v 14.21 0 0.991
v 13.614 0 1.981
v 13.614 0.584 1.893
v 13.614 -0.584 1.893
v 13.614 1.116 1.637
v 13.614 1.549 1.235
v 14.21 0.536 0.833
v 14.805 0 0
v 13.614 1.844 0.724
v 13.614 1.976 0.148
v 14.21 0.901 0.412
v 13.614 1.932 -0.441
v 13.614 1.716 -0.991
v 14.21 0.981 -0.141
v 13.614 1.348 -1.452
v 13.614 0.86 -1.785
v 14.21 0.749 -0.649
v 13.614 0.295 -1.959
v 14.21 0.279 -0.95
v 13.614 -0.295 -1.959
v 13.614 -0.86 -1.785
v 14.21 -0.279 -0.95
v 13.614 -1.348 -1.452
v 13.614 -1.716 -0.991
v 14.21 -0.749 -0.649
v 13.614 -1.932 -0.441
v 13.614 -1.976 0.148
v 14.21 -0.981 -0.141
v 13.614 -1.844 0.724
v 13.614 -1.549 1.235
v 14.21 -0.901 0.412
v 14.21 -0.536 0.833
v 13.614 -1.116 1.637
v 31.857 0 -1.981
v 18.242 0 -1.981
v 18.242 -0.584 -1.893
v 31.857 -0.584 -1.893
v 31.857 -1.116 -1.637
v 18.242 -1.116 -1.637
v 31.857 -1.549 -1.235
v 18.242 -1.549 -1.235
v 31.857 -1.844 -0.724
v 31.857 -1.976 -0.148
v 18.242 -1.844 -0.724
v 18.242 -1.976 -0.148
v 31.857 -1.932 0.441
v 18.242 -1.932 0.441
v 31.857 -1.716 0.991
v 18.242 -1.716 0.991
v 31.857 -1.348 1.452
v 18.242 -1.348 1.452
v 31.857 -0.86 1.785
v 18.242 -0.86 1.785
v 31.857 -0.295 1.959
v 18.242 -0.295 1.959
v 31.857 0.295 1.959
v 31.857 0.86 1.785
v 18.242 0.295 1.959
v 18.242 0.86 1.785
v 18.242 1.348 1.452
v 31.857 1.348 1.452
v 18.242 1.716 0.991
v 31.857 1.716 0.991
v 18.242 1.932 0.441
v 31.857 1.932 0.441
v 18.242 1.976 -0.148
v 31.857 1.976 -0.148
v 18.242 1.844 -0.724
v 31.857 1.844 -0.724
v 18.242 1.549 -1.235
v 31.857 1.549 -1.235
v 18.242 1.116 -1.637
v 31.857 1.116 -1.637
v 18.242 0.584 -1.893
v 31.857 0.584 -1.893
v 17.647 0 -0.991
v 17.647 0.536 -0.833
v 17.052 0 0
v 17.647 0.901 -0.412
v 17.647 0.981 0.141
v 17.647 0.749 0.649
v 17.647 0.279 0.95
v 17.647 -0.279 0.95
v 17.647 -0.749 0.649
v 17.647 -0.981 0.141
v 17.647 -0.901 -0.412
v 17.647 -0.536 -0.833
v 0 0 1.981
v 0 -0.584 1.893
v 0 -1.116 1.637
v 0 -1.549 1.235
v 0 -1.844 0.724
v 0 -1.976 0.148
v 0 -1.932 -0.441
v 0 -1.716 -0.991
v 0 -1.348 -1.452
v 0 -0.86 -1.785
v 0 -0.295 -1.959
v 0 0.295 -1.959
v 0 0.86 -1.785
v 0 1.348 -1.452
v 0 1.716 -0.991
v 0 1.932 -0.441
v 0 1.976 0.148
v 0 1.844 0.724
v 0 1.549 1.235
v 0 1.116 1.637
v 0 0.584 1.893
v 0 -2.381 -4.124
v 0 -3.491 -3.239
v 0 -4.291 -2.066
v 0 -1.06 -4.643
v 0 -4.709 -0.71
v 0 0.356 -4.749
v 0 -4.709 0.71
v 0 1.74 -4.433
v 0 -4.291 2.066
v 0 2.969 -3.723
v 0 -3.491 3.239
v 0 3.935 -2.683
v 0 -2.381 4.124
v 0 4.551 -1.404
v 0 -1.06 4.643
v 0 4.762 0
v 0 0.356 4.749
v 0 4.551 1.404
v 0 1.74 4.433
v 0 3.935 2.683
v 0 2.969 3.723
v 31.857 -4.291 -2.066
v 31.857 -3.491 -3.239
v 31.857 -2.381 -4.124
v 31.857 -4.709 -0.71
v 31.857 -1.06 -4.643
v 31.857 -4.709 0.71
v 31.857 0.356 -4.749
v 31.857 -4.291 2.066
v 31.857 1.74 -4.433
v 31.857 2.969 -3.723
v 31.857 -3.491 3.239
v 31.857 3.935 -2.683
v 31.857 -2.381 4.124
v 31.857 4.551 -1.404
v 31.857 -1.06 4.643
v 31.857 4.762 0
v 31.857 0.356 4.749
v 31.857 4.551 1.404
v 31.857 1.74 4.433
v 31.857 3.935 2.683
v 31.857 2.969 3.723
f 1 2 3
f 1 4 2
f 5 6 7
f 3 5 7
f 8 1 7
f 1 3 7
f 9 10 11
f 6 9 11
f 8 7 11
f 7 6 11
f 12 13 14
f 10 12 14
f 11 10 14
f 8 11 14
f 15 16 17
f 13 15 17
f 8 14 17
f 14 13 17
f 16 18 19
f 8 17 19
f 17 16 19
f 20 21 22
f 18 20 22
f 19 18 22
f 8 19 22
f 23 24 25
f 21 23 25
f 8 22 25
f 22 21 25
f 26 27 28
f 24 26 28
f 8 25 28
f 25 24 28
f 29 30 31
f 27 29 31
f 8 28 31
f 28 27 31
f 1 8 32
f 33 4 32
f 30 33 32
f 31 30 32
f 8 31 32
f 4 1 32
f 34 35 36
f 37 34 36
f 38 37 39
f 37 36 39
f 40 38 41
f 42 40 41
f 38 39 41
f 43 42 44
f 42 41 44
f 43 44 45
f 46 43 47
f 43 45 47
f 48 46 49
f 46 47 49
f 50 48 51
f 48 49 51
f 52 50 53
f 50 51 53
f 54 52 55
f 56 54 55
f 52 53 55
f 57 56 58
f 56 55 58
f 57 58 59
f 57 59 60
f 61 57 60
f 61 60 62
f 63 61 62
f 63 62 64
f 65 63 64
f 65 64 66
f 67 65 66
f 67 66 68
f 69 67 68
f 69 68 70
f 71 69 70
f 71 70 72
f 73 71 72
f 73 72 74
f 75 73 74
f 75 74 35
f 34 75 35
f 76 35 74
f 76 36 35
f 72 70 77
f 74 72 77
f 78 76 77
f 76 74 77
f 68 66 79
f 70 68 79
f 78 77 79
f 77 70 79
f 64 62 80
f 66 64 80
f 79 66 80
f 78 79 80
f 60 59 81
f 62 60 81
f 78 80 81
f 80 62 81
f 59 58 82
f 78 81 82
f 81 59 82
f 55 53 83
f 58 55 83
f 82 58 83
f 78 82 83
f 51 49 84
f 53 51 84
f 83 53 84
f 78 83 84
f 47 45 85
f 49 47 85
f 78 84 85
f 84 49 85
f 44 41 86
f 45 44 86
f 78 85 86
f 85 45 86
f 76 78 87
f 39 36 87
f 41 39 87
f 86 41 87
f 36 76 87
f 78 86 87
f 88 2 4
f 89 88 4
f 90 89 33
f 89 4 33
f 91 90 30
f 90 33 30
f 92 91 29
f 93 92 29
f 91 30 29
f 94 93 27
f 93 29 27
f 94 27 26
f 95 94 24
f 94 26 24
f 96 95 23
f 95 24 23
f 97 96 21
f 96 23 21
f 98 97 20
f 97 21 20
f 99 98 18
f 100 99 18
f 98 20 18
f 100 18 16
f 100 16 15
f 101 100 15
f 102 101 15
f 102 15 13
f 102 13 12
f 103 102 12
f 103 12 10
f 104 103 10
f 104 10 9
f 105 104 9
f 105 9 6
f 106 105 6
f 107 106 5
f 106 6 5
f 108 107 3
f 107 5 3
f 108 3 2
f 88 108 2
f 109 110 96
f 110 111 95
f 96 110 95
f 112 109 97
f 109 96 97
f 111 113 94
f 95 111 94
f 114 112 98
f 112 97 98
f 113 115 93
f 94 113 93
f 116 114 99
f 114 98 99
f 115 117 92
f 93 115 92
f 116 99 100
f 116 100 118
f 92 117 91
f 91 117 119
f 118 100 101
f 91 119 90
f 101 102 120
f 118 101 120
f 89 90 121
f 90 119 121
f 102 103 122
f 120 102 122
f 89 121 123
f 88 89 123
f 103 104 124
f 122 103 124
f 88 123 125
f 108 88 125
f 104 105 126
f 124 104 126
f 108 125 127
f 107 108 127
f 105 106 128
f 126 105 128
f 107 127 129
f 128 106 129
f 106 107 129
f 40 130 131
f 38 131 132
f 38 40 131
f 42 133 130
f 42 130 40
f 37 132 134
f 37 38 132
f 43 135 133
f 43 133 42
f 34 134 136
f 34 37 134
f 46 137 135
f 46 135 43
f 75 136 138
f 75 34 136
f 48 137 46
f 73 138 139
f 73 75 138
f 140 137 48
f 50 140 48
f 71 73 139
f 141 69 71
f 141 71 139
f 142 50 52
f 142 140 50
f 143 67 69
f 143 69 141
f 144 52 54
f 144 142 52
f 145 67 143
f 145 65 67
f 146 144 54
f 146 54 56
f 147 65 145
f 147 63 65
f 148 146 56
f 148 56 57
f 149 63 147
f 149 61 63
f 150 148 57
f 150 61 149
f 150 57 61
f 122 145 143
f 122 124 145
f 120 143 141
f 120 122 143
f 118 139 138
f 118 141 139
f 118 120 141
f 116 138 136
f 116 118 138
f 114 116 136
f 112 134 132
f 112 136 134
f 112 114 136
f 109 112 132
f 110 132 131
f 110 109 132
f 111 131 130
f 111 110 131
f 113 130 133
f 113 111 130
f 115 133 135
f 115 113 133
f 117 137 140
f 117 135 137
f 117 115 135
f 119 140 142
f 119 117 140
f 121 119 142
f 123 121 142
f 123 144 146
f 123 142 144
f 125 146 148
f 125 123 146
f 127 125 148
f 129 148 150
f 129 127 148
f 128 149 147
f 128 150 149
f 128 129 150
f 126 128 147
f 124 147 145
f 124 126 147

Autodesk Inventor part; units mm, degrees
ref_plane "YZ Plane" through (0, 0, 0) normal (1, 0, 0) x (0, 1, 0)
ref_plane "XZ Plane" through (0, 0, 0) normal (0, 1, 0) x (-1, 0, 0)
ref_plane "XY Plane" through (0, 0, 0) normal (0, 0, 1) x (1, 0, 0)
sketch "Sketch1" plane through (0, 0, 0) normal (1, 0, 0) x (0, 1, 0)
  circle A0 centre (0, 0) radius 4.7625
  dimension "d0" = 9.525
extrude "Extrusion1" add sketch "Sketch1" along normal blind 31.8567
sketch "Sketch2" plane through (31.8567, 0, 0) normal (1, 0, 0) x (0, 0, -1)
  point P0 (0, 0)
  point P1 (0, 0)
hole "Hole1" at (31.8567, 0, 0) direction (-1, 0, 0) diameter 3.9624 depth 13.6144 tip angle 118 thread size "10-32 UNF" class "2B" standard "ANSI Unified Screw Threads"
sketch "Sketch3" plane through (0, 0, 0) normal (-1, 0, 0) x (0, 0, 1)
  circle A0 centre (0, 0) radius 1.9812 projected
hole "Hole2" at (0, 0, 0) direction (1, 0, 0) diameter 3.9624 depth 13.6144 tip angle 118 thread size "10-32 UNF" class "2B" standard "ANSI Unified Screw Threads"
properties part number "STOCK,ROUND,0.375inOD,10-32,STANDOFF" material "Aluminum 6061"
